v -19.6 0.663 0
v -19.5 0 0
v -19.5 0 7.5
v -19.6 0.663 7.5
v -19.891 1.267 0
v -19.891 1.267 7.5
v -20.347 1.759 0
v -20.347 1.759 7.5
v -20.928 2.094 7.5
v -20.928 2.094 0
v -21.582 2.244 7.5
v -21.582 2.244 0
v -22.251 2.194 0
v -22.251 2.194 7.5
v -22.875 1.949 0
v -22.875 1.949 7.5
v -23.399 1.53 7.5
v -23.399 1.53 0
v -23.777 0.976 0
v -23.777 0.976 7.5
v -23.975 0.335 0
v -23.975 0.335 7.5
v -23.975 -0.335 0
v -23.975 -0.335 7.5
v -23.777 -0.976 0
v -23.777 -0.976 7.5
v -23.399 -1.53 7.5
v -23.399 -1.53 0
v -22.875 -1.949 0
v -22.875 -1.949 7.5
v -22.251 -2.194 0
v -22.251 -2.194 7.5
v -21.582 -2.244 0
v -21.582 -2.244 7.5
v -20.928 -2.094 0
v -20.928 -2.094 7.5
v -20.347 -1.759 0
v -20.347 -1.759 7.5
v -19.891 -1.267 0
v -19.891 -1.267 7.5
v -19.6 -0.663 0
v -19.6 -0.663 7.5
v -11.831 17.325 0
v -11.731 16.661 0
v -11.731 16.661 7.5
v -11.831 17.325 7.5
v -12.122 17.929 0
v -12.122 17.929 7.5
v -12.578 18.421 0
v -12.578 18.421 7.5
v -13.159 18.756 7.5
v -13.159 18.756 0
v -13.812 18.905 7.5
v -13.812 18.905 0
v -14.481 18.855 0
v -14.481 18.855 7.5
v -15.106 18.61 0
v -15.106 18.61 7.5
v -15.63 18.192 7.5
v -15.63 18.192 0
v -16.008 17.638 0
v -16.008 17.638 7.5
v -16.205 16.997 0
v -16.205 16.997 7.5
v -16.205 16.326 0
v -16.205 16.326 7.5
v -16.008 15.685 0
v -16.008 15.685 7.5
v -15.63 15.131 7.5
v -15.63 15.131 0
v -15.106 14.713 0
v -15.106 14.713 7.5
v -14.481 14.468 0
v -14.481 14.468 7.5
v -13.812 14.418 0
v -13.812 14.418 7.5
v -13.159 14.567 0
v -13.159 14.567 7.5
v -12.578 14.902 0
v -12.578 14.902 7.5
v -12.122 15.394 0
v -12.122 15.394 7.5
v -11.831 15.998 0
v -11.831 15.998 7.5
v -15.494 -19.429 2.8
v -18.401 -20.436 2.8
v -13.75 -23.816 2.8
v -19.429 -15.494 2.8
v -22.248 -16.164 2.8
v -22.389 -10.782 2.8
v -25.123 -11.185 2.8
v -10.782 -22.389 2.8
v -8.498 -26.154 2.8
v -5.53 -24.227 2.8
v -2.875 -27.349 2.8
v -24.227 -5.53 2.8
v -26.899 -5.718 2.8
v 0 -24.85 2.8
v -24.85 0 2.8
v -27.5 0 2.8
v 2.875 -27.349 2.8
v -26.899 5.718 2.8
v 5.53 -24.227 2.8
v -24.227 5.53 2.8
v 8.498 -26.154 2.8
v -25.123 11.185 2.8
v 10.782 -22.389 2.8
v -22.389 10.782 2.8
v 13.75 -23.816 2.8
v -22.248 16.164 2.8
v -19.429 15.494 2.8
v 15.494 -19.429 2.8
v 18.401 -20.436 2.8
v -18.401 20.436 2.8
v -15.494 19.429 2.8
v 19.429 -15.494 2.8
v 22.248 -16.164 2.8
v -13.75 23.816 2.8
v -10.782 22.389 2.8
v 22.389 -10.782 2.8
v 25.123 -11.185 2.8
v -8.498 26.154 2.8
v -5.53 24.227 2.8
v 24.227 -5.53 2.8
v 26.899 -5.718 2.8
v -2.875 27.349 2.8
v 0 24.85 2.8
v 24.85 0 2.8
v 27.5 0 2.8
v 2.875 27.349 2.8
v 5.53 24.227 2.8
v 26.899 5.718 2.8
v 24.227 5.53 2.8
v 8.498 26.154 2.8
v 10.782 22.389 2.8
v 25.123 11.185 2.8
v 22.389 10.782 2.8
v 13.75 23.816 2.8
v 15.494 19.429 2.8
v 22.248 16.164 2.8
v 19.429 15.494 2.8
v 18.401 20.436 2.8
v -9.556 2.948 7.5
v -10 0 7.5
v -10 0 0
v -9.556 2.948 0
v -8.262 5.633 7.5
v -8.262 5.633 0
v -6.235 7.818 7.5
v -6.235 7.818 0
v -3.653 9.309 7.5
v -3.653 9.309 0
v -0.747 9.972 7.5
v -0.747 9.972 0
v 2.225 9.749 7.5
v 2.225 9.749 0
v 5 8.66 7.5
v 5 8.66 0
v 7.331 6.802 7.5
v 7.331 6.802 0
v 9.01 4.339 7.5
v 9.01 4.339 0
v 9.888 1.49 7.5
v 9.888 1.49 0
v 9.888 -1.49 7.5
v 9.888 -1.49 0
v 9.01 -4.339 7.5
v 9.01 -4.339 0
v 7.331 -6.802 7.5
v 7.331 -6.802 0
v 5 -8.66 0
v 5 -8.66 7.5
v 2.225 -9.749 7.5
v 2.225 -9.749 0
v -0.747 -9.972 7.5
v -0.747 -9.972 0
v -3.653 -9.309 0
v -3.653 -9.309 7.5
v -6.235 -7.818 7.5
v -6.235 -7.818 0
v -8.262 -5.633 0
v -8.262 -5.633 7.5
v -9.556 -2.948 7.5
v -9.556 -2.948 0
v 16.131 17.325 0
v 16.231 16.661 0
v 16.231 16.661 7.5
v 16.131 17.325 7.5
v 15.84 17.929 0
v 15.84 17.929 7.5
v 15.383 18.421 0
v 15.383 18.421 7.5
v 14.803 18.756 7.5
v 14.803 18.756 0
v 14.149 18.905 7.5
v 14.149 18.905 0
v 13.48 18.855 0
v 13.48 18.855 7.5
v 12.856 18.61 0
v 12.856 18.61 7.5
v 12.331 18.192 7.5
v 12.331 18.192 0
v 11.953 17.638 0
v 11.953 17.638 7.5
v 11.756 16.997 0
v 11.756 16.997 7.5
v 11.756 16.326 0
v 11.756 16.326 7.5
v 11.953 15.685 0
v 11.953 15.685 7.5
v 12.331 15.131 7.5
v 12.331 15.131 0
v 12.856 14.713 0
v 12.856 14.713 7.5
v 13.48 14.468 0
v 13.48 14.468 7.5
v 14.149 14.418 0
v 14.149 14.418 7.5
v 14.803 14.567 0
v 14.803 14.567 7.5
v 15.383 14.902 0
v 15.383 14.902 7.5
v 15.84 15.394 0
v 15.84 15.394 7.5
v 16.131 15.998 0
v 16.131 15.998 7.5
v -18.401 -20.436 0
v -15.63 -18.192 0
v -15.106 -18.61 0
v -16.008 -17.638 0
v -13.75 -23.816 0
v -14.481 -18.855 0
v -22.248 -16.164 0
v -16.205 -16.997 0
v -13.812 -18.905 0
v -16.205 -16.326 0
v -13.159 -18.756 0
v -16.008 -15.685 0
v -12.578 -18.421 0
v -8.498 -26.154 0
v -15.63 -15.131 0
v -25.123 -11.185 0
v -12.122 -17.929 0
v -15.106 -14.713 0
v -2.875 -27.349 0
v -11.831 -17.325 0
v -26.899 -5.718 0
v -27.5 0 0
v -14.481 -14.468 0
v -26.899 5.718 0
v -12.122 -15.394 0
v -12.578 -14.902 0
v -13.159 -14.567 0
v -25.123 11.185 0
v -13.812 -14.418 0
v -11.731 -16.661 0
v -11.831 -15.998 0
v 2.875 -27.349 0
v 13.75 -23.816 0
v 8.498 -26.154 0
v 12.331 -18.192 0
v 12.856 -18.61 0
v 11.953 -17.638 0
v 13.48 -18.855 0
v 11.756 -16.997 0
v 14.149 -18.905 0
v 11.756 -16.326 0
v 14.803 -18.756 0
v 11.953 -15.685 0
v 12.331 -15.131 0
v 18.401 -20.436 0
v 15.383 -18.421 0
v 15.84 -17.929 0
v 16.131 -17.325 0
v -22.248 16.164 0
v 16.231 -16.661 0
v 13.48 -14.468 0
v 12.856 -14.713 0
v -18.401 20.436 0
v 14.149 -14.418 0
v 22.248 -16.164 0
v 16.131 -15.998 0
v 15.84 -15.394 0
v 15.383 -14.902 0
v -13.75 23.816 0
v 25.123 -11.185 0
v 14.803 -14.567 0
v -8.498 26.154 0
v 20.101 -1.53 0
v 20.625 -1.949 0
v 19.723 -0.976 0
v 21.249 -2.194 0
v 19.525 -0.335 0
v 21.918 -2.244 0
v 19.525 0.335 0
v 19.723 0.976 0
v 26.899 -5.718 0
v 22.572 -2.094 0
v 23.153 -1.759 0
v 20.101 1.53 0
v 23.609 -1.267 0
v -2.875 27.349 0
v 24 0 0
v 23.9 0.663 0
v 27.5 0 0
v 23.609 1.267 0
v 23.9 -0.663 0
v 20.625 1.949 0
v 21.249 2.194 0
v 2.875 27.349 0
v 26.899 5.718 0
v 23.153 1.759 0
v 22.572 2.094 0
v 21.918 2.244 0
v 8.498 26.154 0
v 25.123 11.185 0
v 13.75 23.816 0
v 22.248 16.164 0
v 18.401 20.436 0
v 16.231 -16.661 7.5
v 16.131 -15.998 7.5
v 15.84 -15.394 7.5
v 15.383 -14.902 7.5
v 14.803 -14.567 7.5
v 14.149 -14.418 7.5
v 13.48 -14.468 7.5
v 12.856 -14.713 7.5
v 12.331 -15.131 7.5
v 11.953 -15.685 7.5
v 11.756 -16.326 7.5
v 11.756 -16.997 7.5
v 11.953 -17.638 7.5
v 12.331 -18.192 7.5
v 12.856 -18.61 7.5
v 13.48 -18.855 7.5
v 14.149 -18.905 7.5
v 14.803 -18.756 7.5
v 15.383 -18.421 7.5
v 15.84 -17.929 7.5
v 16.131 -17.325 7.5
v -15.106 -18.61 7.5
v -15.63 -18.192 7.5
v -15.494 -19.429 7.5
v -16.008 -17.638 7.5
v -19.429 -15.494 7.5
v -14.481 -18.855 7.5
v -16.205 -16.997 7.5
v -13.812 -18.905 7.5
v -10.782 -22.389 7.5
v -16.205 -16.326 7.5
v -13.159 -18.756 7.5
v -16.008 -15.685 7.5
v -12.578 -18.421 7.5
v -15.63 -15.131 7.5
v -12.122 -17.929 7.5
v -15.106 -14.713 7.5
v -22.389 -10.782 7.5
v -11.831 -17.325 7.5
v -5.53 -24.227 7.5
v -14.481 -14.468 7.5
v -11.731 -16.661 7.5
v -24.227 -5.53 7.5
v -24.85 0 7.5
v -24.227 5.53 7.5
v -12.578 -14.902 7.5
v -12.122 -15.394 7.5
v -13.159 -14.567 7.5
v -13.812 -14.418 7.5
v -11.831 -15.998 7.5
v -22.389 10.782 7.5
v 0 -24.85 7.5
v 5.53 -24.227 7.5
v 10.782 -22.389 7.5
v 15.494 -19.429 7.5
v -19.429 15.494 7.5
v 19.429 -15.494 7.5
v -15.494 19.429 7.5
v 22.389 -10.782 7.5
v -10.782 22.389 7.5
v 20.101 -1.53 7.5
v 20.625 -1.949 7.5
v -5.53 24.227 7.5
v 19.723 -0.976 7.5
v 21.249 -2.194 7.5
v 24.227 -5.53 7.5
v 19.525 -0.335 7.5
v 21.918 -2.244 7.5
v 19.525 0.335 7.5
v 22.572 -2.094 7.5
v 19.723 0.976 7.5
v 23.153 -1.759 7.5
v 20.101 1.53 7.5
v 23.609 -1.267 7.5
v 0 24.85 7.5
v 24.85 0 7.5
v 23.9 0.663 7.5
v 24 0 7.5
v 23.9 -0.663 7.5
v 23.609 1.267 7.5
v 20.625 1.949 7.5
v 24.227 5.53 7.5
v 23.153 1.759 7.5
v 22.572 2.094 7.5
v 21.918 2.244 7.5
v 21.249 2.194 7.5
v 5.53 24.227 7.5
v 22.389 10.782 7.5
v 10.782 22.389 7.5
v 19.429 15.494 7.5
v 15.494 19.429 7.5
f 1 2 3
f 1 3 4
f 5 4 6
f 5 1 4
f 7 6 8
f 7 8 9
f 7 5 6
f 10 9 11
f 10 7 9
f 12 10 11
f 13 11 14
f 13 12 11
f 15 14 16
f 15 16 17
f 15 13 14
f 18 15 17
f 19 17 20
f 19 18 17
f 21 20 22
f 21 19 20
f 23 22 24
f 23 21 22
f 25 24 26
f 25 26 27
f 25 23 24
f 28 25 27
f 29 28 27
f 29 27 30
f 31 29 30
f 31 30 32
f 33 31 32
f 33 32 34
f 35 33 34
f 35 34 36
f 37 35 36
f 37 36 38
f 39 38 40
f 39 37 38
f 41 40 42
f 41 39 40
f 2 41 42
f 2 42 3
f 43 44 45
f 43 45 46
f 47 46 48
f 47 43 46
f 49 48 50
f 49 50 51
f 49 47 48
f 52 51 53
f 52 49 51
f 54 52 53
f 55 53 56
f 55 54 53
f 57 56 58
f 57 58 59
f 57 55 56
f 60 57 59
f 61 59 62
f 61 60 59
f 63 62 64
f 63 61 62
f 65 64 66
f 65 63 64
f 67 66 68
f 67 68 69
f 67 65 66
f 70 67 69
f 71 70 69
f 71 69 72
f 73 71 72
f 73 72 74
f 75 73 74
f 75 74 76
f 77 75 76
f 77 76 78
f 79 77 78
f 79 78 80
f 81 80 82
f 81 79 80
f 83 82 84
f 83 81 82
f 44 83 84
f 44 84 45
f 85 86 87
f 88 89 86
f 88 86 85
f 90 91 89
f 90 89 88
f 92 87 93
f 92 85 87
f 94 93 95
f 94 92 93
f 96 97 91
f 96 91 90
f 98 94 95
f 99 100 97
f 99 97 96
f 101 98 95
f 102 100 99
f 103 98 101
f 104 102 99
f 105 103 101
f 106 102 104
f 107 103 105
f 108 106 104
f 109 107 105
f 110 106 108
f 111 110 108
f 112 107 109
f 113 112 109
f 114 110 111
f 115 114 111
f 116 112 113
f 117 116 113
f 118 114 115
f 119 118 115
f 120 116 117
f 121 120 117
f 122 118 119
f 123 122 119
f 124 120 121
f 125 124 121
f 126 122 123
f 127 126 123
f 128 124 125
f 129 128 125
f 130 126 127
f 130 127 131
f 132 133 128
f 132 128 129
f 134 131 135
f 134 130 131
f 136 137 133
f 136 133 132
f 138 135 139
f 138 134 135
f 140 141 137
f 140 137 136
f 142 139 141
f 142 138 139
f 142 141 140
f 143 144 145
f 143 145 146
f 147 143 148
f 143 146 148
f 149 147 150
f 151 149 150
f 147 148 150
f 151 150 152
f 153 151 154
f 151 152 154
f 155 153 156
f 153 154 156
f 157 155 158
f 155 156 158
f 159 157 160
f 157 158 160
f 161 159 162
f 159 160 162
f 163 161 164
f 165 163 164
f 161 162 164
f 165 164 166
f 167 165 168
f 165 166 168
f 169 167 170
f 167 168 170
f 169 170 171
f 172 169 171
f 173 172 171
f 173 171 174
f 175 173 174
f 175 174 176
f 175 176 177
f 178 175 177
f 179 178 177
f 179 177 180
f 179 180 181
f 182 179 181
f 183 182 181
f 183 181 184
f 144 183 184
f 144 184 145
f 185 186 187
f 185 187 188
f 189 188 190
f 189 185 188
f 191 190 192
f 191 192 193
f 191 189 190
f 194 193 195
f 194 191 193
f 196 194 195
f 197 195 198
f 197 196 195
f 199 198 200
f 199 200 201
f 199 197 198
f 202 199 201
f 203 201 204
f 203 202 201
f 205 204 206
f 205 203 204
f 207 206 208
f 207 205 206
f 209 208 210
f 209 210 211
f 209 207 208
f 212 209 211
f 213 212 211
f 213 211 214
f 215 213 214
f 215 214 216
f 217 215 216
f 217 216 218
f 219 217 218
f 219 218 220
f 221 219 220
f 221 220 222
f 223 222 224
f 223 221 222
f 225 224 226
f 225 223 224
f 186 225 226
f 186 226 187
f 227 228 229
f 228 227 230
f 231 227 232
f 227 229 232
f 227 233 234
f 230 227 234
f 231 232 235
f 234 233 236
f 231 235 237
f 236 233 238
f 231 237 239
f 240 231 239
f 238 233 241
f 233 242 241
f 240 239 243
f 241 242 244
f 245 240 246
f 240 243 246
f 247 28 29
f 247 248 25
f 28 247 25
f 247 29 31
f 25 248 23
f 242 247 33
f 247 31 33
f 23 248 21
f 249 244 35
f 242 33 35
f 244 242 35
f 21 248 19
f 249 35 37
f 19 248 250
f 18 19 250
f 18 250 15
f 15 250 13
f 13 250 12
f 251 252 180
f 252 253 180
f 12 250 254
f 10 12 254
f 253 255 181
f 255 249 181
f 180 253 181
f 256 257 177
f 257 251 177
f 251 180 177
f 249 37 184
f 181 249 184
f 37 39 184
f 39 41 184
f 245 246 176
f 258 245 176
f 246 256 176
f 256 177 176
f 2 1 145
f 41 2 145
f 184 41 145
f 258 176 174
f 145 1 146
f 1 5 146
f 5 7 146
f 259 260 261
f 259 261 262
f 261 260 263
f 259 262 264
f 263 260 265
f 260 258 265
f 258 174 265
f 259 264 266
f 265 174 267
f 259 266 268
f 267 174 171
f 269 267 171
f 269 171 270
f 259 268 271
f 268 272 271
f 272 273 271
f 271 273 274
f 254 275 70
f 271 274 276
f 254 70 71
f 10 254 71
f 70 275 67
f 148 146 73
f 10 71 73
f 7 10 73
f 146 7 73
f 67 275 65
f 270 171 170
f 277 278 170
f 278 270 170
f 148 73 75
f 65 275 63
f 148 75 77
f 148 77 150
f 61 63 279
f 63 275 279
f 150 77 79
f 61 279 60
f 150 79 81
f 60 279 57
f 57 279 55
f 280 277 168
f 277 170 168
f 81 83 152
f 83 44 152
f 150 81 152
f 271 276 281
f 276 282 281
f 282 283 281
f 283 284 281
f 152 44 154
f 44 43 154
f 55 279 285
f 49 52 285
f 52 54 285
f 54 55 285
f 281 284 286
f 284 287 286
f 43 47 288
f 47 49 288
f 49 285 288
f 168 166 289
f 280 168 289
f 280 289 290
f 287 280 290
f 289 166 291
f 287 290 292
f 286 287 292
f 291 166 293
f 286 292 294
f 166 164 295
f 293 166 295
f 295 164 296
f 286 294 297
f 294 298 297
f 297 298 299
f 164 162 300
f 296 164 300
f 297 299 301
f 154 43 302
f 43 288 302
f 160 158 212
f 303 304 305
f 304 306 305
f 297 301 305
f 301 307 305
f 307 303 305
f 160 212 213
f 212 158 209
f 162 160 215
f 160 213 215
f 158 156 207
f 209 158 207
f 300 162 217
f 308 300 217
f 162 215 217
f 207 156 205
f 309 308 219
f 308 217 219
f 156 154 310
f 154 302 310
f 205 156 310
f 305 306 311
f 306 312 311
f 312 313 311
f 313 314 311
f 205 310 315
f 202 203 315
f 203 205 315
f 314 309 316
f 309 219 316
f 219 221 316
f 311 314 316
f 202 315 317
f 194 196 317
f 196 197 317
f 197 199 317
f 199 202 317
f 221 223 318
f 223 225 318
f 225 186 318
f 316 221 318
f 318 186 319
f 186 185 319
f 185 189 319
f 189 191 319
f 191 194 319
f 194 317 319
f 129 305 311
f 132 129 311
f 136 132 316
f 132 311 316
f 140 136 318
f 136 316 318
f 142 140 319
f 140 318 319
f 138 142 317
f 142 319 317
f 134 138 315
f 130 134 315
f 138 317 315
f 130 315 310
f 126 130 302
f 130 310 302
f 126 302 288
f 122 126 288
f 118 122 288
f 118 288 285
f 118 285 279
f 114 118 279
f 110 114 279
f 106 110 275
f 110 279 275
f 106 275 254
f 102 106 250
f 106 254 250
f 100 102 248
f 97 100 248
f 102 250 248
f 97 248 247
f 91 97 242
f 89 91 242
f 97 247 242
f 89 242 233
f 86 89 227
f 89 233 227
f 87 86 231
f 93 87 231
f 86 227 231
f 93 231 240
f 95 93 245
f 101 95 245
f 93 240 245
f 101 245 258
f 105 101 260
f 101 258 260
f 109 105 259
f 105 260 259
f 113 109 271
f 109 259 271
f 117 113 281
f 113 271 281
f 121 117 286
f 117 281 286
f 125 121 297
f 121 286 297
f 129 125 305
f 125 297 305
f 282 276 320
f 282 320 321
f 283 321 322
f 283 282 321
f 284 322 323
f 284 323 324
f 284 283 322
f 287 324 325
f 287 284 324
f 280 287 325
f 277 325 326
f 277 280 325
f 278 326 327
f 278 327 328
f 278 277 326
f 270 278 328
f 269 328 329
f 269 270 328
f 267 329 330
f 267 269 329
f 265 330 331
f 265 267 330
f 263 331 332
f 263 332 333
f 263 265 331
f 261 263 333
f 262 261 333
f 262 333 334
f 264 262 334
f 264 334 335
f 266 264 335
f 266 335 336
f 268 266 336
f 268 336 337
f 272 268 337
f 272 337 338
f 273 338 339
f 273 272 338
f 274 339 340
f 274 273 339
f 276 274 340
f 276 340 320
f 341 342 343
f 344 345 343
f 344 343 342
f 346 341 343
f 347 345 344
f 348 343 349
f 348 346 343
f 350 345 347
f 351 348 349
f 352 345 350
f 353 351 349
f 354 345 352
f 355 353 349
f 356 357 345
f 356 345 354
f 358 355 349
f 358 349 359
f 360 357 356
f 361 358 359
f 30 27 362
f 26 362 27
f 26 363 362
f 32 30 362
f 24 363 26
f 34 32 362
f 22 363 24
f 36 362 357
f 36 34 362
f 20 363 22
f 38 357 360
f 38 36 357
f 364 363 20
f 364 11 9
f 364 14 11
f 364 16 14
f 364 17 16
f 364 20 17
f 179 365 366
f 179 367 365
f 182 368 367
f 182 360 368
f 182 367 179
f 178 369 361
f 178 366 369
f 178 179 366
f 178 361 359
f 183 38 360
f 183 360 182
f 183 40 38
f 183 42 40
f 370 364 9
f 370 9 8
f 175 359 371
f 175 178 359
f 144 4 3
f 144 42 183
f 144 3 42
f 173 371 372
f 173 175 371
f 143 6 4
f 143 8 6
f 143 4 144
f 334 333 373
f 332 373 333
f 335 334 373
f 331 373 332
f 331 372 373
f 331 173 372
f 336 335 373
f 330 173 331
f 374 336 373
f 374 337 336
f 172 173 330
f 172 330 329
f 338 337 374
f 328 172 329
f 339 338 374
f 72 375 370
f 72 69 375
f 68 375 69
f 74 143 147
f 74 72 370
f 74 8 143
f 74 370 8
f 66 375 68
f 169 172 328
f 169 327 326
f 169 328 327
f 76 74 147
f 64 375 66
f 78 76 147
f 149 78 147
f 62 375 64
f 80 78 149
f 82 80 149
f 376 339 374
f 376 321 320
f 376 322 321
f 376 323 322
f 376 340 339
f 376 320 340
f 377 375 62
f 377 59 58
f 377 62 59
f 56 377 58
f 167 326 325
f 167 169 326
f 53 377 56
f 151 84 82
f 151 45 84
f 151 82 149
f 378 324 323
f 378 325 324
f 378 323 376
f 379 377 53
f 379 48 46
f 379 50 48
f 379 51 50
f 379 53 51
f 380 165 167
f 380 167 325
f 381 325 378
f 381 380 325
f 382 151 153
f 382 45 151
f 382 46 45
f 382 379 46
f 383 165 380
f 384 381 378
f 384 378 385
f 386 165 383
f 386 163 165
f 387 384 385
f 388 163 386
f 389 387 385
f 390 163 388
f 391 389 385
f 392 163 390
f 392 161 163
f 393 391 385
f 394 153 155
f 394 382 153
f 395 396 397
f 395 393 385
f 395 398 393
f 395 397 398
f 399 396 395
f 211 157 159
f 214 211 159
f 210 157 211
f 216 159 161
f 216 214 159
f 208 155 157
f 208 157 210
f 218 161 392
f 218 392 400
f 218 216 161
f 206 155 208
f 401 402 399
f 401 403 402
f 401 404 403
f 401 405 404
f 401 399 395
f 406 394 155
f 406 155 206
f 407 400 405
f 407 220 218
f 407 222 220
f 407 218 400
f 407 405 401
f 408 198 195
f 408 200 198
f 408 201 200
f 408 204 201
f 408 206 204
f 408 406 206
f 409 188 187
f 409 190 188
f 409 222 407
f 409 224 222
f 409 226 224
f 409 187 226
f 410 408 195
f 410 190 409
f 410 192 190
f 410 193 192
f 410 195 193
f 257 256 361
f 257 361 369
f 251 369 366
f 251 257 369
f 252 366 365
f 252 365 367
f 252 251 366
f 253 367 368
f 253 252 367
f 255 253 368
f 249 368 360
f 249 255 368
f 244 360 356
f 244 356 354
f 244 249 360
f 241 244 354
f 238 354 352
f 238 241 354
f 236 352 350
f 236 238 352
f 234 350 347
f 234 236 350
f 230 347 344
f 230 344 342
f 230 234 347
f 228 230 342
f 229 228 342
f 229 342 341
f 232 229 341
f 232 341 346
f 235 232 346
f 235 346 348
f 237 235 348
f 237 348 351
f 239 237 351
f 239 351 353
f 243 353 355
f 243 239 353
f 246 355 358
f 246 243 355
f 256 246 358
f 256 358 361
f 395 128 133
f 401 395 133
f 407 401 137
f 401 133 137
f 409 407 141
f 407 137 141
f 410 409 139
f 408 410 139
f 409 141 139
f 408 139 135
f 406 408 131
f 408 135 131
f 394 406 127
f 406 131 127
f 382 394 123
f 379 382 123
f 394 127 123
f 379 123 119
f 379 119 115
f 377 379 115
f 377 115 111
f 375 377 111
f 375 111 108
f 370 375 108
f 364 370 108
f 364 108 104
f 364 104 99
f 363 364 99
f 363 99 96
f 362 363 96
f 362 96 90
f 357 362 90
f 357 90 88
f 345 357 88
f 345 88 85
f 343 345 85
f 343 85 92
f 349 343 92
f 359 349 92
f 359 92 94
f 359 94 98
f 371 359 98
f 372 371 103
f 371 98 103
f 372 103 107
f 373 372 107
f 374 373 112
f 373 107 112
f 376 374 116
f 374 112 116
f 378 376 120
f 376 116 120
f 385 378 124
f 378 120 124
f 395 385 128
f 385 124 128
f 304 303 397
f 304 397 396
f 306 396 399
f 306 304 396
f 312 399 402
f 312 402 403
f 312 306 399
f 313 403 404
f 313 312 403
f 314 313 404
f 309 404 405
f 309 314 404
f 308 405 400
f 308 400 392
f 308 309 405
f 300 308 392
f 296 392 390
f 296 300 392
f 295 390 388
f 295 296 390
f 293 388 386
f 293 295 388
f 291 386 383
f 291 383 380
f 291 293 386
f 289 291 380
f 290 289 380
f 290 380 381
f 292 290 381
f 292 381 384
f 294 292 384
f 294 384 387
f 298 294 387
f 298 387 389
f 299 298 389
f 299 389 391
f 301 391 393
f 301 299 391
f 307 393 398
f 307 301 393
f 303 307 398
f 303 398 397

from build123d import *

# Parameters (mm, degrees)
SKETCH_1_R          = 24.85
SKETCH_1_R_2        = 2.25
EXTRUDE_1_DEPTH     = 7.5
SKETCH_3_R          = 27.5
SKETCH_3_R_2        = 24.85
EXTRUDE_2_DEPTH     = 2.8
SKETCH_4_R          = 10
CUT_EXTRUDE_1_DEPTH = 40.607448794


with BuildPart() as part:
    # 草图1 → 凸台-拉伸1 (new body)
    with BuildSketch(Plane.XY):
        Circle(SKETCH_1_R)
        with Locations((-21.75, 0)):
            Circle(SKETCH_1_R_2, mode=Mode.SUBTRACT)
        with Locations((-13.980630511, 16.661466638)):
            Circle(SKETCH_1_R_2, mode=Mode.SUBTRACT)
        with Locations((-13.980630511, -16.661466638)):
            Circle(SKETCH_1_R_2, mode=Mode.SUBTRACT)
        with Locations((13.980630511, -16.661466638)):
            Circle(SKETCH_1_R_2, mode=Mode.SUBTRACT)
        with Locations((21.75, 0)):
            Circle(SKETCH_1_R_2, mode=Mode.SUBTRACT)
        with Locations((13.980630511, 16.661466638)):
            Circle(SKETCH_1_R_2, mode=Mode.SUBTRACT)
    extrude(amount=EXTRUDE_1_DEPTH)

    # 草图3 → 凸台-拉伸2 (add)
    with BuildSketch(Plane.XY):
        Circle(SKETCH_3_R)
        Circle(SKETCH_3_R_2, mode=Mode.SUBTRACT)
    extrude(amount=EXTRUDE_2_DEPTH)

    # 草图4 → 切除-拉伸1 (cut, through all)
    with BuildSketch(Plane(origin=(0, 0, 0), x_dir=(-1, 0, 0), z_dir=(0, 0, -1))):
        Circle(SKETCH_4_R)
    extrude(amount=-CUT_EXTRUDE_1_DEPTH, mode=Mode.SUBTRACT)


solid = part.part
